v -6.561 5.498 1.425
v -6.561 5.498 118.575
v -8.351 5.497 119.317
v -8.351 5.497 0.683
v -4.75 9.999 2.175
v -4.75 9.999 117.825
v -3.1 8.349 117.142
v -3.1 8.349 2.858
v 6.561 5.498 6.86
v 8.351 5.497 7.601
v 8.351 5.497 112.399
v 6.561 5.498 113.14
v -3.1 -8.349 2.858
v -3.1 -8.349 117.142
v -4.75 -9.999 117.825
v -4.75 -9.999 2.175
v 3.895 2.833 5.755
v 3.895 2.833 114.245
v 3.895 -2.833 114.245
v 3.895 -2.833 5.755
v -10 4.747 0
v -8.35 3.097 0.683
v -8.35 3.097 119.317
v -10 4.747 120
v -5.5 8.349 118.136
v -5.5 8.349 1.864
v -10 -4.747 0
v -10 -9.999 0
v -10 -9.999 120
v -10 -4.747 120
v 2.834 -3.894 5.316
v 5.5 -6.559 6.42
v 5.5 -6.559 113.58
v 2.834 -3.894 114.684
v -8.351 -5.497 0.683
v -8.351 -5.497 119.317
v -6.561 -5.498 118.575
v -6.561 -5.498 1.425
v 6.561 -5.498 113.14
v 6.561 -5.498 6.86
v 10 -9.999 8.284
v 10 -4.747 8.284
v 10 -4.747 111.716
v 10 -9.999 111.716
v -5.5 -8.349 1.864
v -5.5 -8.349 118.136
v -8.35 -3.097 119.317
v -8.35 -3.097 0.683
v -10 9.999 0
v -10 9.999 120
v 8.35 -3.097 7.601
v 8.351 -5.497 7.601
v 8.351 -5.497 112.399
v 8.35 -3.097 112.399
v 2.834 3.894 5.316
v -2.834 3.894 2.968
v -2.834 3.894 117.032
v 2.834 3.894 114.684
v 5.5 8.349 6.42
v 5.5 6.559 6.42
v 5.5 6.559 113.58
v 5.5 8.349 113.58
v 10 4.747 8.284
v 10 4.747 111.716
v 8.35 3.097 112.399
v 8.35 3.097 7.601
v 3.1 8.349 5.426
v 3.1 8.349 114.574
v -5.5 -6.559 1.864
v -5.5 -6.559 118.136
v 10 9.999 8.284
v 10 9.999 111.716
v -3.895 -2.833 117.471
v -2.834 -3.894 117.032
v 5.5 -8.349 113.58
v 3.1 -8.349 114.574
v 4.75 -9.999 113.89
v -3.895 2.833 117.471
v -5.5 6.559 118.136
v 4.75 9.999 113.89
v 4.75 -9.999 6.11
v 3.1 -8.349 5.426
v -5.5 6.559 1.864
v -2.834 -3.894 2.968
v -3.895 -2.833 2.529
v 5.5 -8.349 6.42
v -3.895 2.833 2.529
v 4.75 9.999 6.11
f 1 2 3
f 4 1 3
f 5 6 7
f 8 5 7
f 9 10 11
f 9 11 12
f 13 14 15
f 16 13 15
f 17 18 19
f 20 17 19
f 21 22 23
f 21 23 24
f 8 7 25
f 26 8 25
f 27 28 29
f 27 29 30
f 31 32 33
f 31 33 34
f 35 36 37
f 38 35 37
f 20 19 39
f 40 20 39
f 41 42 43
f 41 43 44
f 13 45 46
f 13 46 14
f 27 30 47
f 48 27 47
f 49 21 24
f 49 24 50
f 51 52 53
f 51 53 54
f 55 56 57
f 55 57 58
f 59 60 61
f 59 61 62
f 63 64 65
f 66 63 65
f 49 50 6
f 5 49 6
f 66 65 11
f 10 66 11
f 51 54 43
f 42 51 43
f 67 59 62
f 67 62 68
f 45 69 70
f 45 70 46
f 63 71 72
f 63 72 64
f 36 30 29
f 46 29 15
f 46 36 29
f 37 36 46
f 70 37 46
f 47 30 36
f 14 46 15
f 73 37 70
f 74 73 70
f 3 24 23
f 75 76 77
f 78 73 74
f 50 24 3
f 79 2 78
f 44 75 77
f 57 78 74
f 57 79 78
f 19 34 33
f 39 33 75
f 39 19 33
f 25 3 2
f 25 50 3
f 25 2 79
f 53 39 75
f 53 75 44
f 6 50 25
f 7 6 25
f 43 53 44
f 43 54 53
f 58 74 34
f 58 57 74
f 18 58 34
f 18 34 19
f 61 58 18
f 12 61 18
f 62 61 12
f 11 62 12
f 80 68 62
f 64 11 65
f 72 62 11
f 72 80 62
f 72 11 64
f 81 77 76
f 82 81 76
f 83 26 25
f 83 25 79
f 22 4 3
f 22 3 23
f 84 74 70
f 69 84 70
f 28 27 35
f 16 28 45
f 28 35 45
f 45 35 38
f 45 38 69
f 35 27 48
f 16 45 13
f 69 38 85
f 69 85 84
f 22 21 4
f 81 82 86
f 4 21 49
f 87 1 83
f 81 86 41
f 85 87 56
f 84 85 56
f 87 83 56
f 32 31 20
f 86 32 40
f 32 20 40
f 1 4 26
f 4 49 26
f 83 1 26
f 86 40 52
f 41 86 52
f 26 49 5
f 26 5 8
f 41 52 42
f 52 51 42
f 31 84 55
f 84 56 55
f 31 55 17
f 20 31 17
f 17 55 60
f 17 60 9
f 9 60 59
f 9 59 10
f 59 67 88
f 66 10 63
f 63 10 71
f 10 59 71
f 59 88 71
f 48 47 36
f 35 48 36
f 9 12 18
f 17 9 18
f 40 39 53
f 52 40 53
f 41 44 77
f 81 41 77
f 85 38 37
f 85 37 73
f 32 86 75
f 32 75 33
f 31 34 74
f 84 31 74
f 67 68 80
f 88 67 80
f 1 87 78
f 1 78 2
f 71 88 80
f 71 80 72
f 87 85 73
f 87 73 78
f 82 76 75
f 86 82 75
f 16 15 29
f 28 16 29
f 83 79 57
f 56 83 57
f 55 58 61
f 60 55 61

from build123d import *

# Parameters (mm, degrees)
BOSS_EXTRUDE1_DEPTH = 120
CUT_EXTRUDE1_DEPTH  = 123.065088938
CUT_EXTRUDE2_DEPTH  = 123.065088938


with BuildPart() as part:
    # Sketch1 → Boss-Extrude1 (new body)
    with BuildSketch(Plane.XY):
        Polygon((-2.834320347, 3.893970342), (2.834320347, 3.893970342), (5.5, 6.558849663), (5.5, 8.349069506), (3.1, 8.349069506), (4.75, 9.998574117), (10, 9.998574117), (10, 4.746997406), (8.35, 3.097492795), (8.350720674, 5.497492687), (6.560500912, 5.498030255), (3.894821259, 2.833150935), (3.894821259, -2.833150935), (6.560500912, -5.498030255), (8.350720674, -5.497492687), (8.35, -3.097492795), (10, -4.746997406), (10, -9.998574117), (4.75, -9.998574117), (3.1, -8.349069506), (5.5, -8.349069506), (5.5, -6.558849663), (2.834320347, -3.893970342), (-2.834320347, -3.893970342), (-5.5, -6.558849663), (-5.5, -8.349069506), (-3.1, -8.349069506), (-4.75, -9.998574117), (-10, -9.998574117), (-10, -4.746997406), (-8.35, -3.097492795), (-8.350720674, -5.497492687), (-6.560500912, -5.498030255), (-3.894821259, -2.833150935), (-3.894821259, 2.833150935), (-6.560500912, 5.498030255), (-8.350720674, 5.497492687), (-8.35, 3.097492795), (-10, 4.746997406), (-10, 9.998574117), (-4.75, 9.998574117), (-3.1, 8.349069506), (-5.5, 8.349069506), (-5.5, 6.558849663), align=None)
    extrude(amount=BOSS_EXTRUDE1_DEPTH)

    # Sketch2 → Cut-Extrude1 (cut, through all)
    with BuildSketch(Plane(origin=(0, 9.998574117, 0), x_dir=(1, 0, 0), z_dir=(0, 1, 0))):
        Polygon((-10, -120), (10, -111.715728753), (10, -120), align=None)
    extrude(amount=-CUT_EXTRUDE1_DEPTH, mode=Mode.SUBTRACT)

    # Sketch3 → Cut-Extrude2 (cut, through all)
    with BuildSketch(Plane(origin=(0, 9.998574117, 0), x_dir=(1, 0, 0), z_dir=(0, 1, 0))):
        Polygon((-10, 0), (10, -8.284271247), (10, 0), align=None)
    extrude(amount=-CUT_EXTRUDE2_DEPTH, mode=Mode.SUBTRACT)


solid = part.part
